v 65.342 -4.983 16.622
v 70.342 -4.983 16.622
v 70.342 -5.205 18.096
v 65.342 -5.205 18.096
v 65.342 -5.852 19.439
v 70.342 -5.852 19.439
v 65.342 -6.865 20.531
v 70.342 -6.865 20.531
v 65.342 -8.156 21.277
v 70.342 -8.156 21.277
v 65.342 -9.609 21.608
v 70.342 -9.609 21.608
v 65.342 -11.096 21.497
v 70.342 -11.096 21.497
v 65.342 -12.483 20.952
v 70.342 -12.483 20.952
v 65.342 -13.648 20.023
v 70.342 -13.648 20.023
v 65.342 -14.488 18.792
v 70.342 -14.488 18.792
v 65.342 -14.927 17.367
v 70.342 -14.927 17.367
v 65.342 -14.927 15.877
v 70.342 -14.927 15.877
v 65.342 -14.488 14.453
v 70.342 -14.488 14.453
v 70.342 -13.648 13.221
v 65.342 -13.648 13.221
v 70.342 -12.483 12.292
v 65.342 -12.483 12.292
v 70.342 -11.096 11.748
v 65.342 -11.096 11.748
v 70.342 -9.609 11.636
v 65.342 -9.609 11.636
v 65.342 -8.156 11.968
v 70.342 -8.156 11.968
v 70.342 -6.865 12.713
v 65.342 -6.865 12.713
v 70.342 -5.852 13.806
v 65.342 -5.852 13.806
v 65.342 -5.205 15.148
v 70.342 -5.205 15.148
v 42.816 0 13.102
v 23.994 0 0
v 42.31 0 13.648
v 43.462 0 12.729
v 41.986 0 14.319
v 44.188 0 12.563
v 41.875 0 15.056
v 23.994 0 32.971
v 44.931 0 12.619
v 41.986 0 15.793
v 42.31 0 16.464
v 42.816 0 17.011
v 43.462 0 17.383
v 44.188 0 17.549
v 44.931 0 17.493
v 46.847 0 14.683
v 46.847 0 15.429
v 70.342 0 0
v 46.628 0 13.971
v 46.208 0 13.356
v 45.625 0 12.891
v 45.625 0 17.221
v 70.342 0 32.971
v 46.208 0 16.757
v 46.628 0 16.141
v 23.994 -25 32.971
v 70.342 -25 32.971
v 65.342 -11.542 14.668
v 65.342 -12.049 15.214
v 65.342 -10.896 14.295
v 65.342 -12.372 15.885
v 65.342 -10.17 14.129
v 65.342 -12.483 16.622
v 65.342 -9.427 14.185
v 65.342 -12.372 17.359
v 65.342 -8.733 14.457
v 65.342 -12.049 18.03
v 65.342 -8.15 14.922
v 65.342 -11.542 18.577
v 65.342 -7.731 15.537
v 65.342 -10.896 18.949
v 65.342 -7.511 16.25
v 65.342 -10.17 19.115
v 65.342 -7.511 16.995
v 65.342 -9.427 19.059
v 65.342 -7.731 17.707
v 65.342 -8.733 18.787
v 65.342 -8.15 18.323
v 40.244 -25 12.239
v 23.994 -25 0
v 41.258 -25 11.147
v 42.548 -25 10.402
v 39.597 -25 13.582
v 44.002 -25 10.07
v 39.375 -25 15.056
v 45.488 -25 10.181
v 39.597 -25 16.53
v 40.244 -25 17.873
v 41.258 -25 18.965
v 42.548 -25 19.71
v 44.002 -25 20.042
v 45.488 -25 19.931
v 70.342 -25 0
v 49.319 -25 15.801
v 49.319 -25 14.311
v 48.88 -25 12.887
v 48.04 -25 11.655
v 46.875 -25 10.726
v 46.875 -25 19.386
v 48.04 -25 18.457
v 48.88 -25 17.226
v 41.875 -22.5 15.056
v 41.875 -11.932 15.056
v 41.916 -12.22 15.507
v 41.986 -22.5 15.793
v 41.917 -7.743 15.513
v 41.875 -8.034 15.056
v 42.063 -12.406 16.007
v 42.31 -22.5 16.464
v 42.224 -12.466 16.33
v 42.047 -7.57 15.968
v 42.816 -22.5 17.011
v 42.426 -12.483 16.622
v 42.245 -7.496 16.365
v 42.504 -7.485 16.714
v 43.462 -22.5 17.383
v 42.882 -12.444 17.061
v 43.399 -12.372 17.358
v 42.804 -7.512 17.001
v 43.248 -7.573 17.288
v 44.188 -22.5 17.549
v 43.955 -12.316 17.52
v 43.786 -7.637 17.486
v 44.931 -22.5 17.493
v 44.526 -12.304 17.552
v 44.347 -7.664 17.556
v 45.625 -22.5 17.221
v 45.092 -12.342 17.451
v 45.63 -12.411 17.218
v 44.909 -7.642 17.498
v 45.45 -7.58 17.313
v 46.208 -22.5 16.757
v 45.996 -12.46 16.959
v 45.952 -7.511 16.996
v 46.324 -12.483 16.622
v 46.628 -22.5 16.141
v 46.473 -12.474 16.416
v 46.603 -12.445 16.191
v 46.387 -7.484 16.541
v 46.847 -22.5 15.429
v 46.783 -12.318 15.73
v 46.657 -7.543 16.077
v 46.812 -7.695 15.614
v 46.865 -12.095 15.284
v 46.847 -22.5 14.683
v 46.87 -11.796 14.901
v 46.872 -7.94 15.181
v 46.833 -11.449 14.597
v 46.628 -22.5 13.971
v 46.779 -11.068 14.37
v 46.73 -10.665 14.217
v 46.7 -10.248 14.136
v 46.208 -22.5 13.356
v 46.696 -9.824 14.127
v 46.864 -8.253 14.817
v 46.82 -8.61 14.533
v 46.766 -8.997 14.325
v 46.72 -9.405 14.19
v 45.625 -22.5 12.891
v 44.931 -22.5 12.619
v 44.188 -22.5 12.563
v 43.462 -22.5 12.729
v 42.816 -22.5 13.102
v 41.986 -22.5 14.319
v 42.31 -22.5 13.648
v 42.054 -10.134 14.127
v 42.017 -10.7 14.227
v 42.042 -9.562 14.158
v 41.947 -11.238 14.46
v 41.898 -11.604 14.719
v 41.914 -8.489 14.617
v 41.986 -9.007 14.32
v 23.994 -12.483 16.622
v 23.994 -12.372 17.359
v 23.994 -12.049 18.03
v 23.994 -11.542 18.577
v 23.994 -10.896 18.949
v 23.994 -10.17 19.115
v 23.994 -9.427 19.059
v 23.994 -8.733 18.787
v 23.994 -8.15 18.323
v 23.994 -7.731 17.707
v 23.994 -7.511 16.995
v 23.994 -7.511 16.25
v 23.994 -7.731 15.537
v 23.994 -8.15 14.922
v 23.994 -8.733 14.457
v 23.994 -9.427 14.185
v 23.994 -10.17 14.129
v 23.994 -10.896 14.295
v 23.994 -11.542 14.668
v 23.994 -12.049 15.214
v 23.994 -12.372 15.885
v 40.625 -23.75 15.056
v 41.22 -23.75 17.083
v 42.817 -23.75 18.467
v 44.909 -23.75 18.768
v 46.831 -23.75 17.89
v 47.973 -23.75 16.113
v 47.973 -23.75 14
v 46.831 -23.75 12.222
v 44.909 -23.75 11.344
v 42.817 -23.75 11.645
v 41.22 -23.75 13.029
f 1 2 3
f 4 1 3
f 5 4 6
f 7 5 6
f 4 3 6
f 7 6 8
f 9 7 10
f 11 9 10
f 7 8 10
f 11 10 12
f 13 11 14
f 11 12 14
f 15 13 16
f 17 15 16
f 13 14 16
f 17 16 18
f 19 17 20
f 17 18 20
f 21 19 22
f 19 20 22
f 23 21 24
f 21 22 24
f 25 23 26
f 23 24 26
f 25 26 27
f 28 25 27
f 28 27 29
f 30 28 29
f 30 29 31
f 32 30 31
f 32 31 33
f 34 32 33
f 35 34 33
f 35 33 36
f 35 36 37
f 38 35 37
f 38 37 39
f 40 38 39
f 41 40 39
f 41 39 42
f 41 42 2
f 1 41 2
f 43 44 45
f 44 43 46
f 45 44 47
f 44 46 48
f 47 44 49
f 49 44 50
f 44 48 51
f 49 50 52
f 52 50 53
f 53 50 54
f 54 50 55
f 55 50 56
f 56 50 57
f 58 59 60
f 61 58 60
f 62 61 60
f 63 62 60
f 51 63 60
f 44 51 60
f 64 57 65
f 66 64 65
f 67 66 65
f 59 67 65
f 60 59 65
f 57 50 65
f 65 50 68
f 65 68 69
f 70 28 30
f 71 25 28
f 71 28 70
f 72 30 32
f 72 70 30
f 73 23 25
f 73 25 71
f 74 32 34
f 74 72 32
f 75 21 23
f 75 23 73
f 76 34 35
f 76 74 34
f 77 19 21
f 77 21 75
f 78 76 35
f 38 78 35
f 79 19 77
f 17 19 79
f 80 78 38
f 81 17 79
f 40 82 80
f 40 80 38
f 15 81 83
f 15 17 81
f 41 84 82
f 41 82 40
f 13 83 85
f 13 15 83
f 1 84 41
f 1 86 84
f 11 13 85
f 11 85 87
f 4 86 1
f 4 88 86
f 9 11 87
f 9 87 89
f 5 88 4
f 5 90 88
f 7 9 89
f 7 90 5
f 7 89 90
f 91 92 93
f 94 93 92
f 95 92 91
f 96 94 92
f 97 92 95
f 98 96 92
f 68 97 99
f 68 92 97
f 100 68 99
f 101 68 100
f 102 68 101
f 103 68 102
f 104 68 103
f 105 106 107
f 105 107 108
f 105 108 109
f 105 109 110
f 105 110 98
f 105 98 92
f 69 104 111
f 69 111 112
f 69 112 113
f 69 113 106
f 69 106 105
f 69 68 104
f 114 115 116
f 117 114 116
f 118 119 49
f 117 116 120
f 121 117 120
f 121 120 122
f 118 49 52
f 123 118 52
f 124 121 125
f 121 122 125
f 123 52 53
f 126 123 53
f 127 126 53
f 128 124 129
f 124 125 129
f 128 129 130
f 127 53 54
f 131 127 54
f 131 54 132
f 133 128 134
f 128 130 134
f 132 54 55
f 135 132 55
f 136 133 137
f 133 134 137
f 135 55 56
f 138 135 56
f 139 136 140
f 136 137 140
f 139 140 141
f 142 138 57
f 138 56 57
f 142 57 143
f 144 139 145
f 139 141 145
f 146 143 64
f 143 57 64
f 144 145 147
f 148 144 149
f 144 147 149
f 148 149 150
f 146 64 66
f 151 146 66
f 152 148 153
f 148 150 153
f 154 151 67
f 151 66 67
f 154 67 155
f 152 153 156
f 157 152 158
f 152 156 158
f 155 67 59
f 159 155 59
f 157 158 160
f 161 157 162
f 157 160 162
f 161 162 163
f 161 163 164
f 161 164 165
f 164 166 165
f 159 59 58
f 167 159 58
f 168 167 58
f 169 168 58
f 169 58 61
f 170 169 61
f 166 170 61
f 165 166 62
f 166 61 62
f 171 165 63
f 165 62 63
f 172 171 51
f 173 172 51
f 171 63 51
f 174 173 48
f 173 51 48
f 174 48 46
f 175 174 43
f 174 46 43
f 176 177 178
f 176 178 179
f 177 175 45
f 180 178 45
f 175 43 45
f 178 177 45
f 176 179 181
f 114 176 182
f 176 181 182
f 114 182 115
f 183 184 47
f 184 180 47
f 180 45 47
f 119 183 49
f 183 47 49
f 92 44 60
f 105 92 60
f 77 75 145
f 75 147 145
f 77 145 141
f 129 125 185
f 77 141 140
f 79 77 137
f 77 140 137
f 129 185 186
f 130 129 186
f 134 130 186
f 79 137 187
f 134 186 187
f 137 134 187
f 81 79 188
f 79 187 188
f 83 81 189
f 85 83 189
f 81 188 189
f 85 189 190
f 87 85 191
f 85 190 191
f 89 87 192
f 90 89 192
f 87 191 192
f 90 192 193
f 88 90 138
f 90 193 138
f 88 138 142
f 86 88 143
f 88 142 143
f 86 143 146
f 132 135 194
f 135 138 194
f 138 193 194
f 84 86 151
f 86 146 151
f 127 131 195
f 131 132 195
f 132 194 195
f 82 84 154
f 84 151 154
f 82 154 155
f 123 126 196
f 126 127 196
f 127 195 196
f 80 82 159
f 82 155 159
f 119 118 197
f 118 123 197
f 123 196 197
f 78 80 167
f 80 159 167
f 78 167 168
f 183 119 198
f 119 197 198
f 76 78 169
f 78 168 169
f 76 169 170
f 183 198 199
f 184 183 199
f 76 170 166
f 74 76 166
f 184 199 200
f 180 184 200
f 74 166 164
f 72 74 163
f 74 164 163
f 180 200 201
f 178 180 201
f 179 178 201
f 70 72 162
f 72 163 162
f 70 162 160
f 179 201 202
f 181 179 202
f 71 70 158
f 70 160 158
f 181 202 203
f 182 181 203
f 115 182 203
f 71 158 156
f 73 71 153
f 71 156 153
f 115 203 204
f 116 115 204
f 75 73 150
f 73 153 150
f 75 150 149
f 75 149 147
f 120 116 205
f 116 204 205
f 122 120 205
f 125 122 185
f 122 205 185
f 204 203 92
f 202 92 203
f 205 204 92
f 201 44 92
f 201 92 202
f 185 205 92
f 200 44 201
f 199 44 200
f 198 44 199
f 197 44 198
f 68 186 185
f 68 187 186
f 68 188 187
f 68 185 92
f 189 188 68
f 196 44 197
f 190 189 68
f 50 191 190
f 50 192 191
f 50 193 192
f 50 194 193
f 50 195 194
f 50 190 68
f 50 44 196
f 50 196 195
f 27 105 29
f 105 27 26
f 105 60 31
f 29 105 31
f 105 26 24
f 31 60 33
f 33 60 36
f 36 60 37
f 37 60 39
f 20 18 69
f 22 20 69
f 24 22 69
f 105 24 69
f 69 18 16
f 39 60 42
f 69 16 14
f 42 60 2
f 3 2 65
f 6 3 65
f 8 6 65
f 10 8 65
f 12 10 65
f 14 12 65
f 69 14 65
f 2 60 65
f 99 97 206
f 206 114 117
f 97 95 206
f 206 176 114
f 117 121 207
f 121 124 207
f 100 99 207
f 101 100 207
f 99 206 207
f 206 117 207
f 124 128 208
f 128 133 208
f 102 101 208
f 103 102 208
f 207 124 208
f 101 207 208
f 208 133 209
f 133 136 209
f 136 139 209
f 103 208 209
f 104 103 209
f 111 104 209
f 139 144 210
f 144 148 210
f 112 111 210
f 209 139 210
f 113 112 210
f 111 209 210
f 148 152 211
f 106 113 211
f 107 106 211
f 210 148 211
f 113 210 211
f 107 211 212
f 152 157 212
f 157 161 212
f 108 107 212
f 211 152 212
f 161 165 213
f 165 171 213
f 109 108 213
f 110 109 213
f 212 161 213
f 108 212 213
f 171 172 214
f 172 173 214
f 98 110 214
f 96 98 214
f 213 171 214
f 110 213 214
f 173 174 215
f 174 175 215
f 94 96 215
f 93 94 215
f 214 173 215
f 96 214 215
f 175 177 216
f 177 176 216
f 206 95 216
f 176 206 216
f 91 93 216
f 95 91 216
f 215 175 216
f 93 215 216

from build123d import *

# Parameters (mm, degrees)
F0_W           = 46.347648
F0_H           = 32.971419
F1_DEPTH       = 25
F3_D           = 5
F3_CSINK_D     = 10
F3_CSINK_ANGLE = 90
F5_D           = 5
F5_CBORE_D     = 10
F5_CBORE_DEPTH = 5


with BuildPart() as f1:
    # F0 (on Front) → F1 (new body)
    with BuildSketch(Plane.XZ):
        with Locations((47.167972, 16.485709)):
            Rectangle(F0_W, F0_H)
    extrude(amount=F1_DEPTH)

    # F3 (through all)
    with Locations(Plane.XZ.offset(25)):
        with Locations((44.375189, 15.056089)):
            CounterSinkHole(F3_D / 2, F3_CSINK_D / 2, counter_sink_angle=F3_CSINK_ANGLE)

    # F5 (through all)
    with Locations(Plane.YZ.offset(70.341796)):
        with Locations((-9.982947, 16.622152)):
            CounterBoreHole(F5_D / 2, F5_CBORE_D / 2, F5_CBORE_DEPTH)


solid = f1.part
